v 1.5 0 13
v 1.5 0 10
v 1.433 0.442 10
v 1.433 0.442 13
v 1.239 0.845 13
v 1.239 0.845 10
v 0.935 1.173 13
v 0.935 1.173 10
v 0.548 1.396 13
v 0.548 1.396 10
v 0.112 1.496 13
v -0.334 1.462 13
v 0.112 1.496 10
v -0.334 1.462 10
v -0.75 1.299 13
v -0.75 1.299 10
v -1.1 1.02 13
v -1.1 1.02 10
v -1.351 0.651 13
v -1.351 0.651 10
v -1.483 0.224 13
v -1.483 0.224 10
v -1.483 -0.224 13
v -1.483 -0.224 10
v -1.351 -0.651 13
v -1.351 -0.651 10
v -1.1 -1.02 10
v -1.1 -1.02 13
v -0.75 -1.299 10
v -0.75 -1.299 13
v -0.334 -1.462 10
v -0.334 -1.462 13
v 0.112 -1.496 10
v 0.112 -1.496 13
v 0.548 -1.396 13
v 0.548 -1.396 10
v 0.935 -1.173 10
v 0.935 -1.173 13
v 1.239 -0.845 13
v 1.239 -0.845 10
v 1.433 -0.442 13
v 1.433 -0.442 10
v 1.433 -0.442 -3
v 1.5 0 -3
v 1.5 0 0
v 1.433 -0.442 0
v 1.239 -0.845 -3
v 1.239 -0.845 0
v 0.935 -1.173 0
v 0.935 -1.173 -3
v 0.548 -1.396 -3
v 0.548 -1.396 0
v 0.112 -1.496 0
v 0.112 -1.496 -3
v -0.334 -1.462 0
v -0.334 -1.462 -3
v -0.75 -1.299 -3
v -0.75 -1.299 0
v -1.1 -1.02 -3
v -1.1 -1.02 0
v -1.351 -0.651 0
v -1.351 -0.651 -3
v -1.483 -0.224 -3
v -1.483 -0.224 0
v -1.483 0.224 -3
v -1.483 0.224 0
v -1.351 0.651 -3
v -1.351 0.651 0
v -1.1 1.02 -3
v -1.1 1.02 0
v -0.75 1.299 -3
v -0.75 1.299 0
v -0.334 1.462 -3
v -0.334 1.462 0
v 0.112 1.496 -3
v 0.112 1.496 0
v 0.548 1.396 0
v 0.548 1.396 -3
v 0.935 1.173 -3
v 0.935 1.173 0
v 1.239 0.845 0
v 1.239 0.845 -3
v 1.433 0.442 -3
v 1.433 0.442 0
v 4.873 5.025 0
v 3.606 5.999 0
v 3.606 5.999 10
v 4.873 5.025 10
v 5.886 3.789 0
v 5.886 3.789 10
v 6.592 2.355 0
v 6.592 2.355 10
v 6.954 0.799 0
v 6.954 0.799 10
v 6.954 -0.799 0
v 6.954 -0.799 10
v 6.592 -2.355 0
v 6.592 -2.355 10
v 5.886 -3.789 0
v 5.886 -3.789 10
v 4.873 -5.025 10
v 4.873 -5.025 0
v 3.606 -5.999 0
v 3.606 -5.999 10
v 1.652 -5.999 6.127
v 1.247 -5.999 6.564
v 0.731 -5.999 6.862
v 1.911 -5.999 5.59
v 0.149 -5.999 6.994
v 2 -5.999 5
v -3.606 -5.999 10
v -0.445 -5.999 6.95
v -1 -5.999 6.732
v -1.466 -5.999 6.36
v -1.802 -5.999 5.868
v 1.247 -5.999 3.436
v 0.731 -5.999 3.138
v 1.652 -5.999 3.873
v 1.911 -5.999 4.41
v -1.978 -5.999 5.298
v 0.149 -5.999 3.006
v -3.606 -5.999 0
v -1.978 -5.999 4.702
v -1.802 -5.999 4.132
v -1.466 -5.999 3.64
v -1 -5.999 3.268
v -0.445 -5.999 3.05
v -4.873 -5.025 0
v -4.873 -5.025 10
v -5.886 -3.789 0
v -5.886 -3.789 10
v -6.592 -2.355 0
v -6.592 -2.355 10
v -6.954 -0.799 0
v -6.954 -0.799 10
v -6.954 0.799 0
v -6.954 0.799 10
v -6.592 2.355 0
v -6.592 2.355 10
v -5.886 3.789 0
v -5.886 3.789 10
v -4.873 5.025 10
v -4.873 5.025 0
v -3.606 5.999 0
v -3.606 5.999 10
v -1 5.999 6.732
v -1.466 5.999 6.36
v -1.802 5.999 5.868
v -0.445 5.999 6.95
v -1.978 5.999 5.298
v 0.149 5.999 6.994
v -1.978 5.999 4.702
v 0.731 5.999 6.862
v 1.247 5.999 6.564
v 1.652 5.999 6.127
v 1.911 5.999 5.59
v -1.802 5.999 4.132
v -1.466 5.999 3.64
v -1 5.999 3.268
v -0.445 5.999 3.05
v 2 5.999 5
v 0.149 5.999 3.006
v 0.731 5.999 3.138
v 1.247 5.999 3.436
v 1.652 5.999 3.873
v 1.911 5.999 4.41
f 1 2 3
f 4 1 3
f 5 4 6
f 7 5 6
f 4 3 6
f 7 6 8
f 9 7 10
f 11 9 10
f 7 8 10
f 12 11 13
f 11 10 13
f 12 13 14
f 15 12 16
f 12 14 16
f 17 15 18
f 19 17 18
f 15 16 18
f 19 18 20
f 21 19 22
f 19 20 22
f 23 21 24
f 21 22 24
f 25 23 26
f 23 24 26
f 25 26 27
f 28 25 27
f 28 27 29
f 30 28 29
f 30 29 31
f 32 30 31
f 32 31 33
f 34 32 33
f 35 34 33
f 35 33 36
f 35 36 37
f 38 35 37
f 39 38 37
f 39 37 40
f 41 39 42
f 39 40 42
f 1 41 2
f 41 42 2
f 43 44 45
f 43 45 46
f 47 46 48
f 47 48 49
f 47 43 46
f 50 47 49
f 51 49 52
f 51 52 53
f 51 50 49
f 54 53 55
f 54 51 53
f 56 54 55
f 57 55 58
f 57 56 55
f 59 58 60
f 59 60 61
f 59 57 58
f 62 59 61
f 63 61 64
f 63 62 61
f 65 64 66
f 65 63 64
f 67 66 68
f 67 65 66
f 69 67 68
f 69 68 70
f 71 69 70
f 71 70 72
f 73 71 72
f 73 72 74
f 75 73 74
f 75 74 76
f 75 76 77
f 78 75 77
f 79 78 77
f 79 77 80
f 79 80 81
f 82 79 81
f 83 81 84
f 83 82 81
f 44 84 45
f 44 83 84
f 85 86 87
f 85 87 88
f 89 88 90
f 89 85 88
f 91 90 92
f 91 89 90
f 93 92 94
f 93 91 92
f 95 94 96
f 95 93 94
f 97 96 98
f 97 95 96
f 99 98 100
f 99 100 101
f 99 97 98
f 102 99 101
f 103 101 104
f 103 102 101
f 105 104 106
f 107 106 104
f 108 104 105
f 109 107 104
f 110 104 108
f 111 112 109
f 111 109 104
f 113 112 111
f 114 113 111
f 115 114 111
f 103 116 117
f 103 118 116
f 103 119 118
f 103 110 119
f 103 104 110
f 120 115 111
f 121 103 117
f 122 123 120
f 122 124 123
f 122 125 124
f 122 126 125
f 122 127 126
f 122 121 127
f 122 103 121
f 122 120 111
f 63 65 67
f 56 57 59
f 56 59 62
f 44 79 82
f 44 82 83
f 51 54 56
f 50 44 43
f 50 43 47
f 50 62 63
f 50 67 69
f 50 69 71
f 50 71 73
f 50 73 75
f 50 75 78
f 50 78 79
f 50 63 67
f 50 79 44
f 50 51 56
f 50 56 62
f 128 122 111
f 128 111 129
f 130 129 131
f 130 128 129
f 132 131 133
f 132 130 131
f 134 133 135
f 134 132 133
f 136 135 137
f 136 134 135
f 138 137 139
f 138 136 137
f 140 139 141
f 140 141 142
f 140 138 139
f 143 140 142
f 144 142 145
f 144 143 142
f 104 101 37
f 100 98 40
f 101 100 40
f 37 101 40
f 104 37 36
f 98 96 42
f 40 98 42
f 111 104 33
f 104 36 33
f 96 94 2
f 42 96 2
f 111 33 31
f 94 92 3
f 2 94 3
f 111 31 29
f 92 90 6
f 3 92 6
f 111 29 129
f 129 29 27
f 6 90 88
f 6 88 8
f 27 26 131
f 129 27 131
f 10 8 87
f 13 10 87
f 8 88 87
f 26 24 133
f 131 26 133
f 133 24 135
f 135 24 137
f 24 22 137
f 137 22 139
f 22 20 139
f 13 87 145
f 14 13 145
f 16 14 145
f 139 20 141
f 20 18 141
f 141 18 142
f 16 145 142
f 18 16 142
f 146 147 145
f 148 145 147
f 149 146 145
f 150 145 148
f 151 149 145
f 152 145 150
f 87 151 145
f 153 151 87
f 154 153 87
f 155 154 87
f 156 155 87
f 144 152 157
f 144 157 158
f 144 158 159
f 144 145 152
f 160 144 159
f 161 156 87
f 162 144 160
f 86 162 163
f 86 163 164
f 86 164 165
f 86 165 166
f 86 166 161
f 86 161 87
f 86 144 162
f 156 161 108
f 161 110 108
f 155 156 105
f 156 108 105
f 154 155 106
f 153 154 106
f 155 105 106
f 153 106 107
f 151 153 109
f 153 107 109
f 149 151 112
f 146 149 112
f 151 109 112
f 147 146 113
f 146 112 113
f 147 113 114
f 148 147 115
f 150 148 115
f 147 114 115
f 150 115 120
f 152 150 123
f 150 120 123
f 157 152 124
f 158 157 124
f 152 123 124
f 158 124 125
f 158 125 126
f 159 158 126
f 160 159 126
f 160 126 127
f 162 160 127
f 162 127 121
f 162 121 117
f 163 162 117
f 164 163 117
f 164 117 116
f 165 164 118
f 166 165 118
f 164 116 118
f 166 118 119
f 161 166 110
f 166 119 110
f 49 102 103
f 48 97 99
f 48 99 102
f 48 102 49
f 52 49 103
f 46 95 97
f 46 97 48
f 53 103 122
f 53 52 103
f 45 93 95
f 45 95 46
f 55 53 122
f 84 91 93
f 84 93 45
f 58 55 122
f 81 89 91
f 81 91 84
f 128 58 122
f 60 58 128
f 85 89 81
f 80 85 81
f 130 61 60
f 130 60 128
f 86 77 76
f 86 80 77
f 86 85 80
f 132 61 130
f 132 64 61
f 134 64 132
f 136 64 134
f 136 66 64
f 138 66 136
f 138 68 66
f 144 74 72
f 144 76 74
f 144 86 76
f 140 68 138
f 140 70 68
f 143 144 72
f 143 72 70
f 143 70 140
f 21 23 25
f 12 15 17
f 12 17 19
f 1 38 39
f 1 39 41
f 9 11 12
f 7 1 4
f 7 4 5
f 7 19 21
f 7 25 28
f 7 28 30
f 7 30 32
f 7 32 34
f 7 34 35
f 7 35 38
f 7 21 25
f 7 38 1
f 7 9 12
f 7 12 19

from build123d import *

# Parameters (mm, degrees)
BASE_EXTRUSION_DEPTH = 10
ESQUISSE2_R          = 1.5
BOSS_EXTRU_1_DEPTH   = 3
BOSS_EXTRU_2_START   = 3
ESQUISSE3_R          = 1.5
BOSS_EXTRU_2_DEPTH   = 3
PER_AGE1_D           = 4
PER_AGE1_DEPTH       = 11.99888719
PER_AGE1_TIP         = 1.201721238


with BuildPart() as part:
    # Esquisse1 → Base-Extrusion (new body)
    with BuildSketch(Plane.XY):
        with BuildLine():
            Line((-3.606477028, 5.999443595), (3.606477028, 5.999443595))
            ThreePointArc((3.606477028, 5.999443595), (7, 0), (3.606477028, -5.999443595))
            Line((3.606477028, -5.999443595), (-3.606477028, -5.999443595))
            ThreePointArc((-3.606477028, -5.999443595), (-7, 0), (-3.606477028, 5.999443595))
        make_face()
    extrude(amount=BASE_EXTRUSION_DEPTH)

    # Esquisse2 → Boss.-Extru.1 (add)
    with BuildSketch(Plane.XY.offset(10)):
        Circle(ESQUISSE2_R)
    extrude(amount=BOSS_EXTRU_1_DEPTH)

    # Esquisse3 → Boss.-Extru.2 (add)
    with BuildSketch(Plane(origin=(0, 0, 0), x_dir=(-1, 0, 0), z_dir=(0, 0, -1)).offset(BOSS_EXTRU_2_START)):
        with Locations(Location((0, 0, 0), (0, 0, 180))):
            Circle(ESQUISSE3_R)
    extrude(amount=-BOSS_EXTRU_2_DEPTH)

    # Perçage1
    with Locations(Plane(origin=(0, 5.999443595, 0), x_dir=(-1, 0, 0), z_dir=(0, 1, 0))):
        with Locations((0, 5)):
            Hole(PER_AGE1_D / 2, depth=PER_AGE1_DEPTH)
            with Locations((0, 0, -(PER_AGE1_DEPTH + PER_AGE1_TIP / 2))):  # 118° drill point
                Cone(0, PER_AGE1_D / 2, PER_AGE1_TIP, mode=Mode.SUBTRACT)


solid = part.part
